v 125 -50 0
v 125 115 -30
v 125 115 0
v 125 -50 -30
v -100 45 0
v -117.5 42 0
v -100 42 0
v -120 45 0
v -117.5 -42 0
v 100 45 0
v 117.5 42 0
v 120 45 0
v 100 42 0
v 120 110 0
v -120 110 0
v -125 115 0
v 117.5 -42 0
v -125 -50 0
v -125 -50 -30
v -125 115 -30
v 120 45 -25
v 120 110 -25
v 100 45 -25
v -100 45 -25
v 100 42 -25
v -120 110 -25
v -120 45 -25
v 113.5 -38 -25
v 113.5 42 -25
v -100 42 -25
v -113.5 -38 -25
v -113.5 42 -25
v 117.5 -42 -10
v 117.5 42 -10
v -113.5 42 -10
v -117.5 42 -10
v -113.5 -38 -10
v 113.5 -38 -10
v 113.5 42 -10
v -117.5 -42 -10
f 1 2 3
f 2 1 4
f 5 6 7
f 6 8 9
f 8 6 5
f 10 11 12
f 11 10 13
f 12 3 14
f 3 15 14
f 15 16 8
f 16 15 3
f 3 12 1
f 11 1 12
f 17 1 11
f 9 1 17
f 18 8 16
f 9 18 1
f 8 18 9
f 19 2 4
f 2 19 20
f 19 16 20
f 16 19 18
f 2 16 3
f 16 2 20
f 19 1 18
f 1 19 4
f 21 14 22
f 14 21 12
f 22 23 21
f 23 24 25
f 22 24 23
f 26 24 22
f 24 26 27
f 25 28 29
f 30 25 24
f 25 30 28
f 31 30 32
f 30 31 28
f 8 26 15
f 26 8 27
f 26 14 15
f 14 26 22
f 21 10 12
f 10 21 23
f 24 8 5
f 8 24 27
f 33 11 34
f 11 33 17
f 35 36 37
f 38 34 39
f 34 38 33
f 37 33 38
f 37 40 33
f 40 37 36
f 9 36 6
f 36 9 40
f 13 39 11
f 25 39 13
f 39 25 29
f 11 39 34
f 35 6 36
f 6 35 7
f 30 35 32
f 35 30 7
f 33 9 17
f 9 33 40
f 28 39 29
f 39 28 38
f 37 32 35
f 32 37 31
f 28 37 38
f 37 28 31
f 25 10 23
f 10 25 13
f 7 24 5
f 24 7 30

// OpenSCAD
/*
    Type-O writing device
*/

module keyboard(){
    rotate([180,0,0]){
        // keyboard mounting plate
        import("reference/planckplate_v2_tab_fix.stl");
    }
}

// lcd display
module 40x4_LCD(){
    // overall PCB
    color("green")
    cube([190,54,1.6]);
    
    // TODO: mounting holes (183x47)
    
    // bezel
    color("blue")
    translate([(190/2)-(166/2),(54/2)-(43.1/2),1]){
        cube([166.0,43.1,9]);
    }
    
    // viewing area
    color("white")
    translate([(190/2)-(147/2),(54/2)-(29.5/2),2]){
        cube([147,29.5,9]);
    }
    
    // TOOD: active area (140.45x23.16)
    
    // TODO: solder pads/pins
}

// TODO: lipo cell
// TODO: boost converter
// TODO: mode switch
// TODO: reset button

// case top
module case_top(){
    difference(){
        color("red")
        cube([250,165,10]);
        
        // hollow-out
        translate([(250/2)-(230/2)-5,(170/2)-(150/2)-5,-1]){
            cube([240,155,6]);
        }
        
        // lcd hole
        translate([(250/2)-(166/2)-1,105,0]){
            cube([168.0,44,12]);
        }
        
        // keyboad hole
        translate([(250/2)-(233/2)-1,8,-1]){
            cube([235,84,12]);
        }
        
        // USB-C hole
        translate([225,158,-1]){
            cube([15,15,8]);
        }
    }
    
    // TODO: keyboard retainer
    // TODO: LCD mounting posts
    // TODO: Feather mounting posts
}
// case bottom
module case_bottom(){
    difference(){
        color("red")
        //cube([250,165,10]);
        cube([250,165,30]);
        
        // electronics opening
        //translate([(250/2)-(230/2)-5,85,5]){
        translate([(250/2)-(230/2)-5,95,5]){
            //cube([240,75,6]);
            cube([240,65,30]);
        }
        
        // keyboard opening
        //translate([(250/2)-(235/2),8,8]){
        translate([(250/2)-(235/2),8,20]){
            //#cube([235,84,12]);
            cube([235,84,30]);
        }
        // cut-out under keyboard
        //translate([(250/2)-(227/2),12,5]){
        translate([(250/2)-(227/2),12,5]){
            //#cube([227,84,12]);
            cube([227,80,30]);
        }
        
        // keyboard wiring opening
        translate([(250/2)-(200/2),90,5]){
            cube([200,10,30]);
        }
        
        // TODO: reset hole
    }
        
}

// Assemble!
translate([-1,0,0]){
    //keyboard();
}

translate([-190/2,50,1]){
    //40x4_LCD();
}

translate([-250/2,-50,30]){
    //case_top();
}

translate([119,110,3]){
    rotate([0,180,90]){
        //import("reference/4884 Feather RP2040.stl");
    }
}

translate([-250/2,-50,-30]){
    case_bottom();
}
